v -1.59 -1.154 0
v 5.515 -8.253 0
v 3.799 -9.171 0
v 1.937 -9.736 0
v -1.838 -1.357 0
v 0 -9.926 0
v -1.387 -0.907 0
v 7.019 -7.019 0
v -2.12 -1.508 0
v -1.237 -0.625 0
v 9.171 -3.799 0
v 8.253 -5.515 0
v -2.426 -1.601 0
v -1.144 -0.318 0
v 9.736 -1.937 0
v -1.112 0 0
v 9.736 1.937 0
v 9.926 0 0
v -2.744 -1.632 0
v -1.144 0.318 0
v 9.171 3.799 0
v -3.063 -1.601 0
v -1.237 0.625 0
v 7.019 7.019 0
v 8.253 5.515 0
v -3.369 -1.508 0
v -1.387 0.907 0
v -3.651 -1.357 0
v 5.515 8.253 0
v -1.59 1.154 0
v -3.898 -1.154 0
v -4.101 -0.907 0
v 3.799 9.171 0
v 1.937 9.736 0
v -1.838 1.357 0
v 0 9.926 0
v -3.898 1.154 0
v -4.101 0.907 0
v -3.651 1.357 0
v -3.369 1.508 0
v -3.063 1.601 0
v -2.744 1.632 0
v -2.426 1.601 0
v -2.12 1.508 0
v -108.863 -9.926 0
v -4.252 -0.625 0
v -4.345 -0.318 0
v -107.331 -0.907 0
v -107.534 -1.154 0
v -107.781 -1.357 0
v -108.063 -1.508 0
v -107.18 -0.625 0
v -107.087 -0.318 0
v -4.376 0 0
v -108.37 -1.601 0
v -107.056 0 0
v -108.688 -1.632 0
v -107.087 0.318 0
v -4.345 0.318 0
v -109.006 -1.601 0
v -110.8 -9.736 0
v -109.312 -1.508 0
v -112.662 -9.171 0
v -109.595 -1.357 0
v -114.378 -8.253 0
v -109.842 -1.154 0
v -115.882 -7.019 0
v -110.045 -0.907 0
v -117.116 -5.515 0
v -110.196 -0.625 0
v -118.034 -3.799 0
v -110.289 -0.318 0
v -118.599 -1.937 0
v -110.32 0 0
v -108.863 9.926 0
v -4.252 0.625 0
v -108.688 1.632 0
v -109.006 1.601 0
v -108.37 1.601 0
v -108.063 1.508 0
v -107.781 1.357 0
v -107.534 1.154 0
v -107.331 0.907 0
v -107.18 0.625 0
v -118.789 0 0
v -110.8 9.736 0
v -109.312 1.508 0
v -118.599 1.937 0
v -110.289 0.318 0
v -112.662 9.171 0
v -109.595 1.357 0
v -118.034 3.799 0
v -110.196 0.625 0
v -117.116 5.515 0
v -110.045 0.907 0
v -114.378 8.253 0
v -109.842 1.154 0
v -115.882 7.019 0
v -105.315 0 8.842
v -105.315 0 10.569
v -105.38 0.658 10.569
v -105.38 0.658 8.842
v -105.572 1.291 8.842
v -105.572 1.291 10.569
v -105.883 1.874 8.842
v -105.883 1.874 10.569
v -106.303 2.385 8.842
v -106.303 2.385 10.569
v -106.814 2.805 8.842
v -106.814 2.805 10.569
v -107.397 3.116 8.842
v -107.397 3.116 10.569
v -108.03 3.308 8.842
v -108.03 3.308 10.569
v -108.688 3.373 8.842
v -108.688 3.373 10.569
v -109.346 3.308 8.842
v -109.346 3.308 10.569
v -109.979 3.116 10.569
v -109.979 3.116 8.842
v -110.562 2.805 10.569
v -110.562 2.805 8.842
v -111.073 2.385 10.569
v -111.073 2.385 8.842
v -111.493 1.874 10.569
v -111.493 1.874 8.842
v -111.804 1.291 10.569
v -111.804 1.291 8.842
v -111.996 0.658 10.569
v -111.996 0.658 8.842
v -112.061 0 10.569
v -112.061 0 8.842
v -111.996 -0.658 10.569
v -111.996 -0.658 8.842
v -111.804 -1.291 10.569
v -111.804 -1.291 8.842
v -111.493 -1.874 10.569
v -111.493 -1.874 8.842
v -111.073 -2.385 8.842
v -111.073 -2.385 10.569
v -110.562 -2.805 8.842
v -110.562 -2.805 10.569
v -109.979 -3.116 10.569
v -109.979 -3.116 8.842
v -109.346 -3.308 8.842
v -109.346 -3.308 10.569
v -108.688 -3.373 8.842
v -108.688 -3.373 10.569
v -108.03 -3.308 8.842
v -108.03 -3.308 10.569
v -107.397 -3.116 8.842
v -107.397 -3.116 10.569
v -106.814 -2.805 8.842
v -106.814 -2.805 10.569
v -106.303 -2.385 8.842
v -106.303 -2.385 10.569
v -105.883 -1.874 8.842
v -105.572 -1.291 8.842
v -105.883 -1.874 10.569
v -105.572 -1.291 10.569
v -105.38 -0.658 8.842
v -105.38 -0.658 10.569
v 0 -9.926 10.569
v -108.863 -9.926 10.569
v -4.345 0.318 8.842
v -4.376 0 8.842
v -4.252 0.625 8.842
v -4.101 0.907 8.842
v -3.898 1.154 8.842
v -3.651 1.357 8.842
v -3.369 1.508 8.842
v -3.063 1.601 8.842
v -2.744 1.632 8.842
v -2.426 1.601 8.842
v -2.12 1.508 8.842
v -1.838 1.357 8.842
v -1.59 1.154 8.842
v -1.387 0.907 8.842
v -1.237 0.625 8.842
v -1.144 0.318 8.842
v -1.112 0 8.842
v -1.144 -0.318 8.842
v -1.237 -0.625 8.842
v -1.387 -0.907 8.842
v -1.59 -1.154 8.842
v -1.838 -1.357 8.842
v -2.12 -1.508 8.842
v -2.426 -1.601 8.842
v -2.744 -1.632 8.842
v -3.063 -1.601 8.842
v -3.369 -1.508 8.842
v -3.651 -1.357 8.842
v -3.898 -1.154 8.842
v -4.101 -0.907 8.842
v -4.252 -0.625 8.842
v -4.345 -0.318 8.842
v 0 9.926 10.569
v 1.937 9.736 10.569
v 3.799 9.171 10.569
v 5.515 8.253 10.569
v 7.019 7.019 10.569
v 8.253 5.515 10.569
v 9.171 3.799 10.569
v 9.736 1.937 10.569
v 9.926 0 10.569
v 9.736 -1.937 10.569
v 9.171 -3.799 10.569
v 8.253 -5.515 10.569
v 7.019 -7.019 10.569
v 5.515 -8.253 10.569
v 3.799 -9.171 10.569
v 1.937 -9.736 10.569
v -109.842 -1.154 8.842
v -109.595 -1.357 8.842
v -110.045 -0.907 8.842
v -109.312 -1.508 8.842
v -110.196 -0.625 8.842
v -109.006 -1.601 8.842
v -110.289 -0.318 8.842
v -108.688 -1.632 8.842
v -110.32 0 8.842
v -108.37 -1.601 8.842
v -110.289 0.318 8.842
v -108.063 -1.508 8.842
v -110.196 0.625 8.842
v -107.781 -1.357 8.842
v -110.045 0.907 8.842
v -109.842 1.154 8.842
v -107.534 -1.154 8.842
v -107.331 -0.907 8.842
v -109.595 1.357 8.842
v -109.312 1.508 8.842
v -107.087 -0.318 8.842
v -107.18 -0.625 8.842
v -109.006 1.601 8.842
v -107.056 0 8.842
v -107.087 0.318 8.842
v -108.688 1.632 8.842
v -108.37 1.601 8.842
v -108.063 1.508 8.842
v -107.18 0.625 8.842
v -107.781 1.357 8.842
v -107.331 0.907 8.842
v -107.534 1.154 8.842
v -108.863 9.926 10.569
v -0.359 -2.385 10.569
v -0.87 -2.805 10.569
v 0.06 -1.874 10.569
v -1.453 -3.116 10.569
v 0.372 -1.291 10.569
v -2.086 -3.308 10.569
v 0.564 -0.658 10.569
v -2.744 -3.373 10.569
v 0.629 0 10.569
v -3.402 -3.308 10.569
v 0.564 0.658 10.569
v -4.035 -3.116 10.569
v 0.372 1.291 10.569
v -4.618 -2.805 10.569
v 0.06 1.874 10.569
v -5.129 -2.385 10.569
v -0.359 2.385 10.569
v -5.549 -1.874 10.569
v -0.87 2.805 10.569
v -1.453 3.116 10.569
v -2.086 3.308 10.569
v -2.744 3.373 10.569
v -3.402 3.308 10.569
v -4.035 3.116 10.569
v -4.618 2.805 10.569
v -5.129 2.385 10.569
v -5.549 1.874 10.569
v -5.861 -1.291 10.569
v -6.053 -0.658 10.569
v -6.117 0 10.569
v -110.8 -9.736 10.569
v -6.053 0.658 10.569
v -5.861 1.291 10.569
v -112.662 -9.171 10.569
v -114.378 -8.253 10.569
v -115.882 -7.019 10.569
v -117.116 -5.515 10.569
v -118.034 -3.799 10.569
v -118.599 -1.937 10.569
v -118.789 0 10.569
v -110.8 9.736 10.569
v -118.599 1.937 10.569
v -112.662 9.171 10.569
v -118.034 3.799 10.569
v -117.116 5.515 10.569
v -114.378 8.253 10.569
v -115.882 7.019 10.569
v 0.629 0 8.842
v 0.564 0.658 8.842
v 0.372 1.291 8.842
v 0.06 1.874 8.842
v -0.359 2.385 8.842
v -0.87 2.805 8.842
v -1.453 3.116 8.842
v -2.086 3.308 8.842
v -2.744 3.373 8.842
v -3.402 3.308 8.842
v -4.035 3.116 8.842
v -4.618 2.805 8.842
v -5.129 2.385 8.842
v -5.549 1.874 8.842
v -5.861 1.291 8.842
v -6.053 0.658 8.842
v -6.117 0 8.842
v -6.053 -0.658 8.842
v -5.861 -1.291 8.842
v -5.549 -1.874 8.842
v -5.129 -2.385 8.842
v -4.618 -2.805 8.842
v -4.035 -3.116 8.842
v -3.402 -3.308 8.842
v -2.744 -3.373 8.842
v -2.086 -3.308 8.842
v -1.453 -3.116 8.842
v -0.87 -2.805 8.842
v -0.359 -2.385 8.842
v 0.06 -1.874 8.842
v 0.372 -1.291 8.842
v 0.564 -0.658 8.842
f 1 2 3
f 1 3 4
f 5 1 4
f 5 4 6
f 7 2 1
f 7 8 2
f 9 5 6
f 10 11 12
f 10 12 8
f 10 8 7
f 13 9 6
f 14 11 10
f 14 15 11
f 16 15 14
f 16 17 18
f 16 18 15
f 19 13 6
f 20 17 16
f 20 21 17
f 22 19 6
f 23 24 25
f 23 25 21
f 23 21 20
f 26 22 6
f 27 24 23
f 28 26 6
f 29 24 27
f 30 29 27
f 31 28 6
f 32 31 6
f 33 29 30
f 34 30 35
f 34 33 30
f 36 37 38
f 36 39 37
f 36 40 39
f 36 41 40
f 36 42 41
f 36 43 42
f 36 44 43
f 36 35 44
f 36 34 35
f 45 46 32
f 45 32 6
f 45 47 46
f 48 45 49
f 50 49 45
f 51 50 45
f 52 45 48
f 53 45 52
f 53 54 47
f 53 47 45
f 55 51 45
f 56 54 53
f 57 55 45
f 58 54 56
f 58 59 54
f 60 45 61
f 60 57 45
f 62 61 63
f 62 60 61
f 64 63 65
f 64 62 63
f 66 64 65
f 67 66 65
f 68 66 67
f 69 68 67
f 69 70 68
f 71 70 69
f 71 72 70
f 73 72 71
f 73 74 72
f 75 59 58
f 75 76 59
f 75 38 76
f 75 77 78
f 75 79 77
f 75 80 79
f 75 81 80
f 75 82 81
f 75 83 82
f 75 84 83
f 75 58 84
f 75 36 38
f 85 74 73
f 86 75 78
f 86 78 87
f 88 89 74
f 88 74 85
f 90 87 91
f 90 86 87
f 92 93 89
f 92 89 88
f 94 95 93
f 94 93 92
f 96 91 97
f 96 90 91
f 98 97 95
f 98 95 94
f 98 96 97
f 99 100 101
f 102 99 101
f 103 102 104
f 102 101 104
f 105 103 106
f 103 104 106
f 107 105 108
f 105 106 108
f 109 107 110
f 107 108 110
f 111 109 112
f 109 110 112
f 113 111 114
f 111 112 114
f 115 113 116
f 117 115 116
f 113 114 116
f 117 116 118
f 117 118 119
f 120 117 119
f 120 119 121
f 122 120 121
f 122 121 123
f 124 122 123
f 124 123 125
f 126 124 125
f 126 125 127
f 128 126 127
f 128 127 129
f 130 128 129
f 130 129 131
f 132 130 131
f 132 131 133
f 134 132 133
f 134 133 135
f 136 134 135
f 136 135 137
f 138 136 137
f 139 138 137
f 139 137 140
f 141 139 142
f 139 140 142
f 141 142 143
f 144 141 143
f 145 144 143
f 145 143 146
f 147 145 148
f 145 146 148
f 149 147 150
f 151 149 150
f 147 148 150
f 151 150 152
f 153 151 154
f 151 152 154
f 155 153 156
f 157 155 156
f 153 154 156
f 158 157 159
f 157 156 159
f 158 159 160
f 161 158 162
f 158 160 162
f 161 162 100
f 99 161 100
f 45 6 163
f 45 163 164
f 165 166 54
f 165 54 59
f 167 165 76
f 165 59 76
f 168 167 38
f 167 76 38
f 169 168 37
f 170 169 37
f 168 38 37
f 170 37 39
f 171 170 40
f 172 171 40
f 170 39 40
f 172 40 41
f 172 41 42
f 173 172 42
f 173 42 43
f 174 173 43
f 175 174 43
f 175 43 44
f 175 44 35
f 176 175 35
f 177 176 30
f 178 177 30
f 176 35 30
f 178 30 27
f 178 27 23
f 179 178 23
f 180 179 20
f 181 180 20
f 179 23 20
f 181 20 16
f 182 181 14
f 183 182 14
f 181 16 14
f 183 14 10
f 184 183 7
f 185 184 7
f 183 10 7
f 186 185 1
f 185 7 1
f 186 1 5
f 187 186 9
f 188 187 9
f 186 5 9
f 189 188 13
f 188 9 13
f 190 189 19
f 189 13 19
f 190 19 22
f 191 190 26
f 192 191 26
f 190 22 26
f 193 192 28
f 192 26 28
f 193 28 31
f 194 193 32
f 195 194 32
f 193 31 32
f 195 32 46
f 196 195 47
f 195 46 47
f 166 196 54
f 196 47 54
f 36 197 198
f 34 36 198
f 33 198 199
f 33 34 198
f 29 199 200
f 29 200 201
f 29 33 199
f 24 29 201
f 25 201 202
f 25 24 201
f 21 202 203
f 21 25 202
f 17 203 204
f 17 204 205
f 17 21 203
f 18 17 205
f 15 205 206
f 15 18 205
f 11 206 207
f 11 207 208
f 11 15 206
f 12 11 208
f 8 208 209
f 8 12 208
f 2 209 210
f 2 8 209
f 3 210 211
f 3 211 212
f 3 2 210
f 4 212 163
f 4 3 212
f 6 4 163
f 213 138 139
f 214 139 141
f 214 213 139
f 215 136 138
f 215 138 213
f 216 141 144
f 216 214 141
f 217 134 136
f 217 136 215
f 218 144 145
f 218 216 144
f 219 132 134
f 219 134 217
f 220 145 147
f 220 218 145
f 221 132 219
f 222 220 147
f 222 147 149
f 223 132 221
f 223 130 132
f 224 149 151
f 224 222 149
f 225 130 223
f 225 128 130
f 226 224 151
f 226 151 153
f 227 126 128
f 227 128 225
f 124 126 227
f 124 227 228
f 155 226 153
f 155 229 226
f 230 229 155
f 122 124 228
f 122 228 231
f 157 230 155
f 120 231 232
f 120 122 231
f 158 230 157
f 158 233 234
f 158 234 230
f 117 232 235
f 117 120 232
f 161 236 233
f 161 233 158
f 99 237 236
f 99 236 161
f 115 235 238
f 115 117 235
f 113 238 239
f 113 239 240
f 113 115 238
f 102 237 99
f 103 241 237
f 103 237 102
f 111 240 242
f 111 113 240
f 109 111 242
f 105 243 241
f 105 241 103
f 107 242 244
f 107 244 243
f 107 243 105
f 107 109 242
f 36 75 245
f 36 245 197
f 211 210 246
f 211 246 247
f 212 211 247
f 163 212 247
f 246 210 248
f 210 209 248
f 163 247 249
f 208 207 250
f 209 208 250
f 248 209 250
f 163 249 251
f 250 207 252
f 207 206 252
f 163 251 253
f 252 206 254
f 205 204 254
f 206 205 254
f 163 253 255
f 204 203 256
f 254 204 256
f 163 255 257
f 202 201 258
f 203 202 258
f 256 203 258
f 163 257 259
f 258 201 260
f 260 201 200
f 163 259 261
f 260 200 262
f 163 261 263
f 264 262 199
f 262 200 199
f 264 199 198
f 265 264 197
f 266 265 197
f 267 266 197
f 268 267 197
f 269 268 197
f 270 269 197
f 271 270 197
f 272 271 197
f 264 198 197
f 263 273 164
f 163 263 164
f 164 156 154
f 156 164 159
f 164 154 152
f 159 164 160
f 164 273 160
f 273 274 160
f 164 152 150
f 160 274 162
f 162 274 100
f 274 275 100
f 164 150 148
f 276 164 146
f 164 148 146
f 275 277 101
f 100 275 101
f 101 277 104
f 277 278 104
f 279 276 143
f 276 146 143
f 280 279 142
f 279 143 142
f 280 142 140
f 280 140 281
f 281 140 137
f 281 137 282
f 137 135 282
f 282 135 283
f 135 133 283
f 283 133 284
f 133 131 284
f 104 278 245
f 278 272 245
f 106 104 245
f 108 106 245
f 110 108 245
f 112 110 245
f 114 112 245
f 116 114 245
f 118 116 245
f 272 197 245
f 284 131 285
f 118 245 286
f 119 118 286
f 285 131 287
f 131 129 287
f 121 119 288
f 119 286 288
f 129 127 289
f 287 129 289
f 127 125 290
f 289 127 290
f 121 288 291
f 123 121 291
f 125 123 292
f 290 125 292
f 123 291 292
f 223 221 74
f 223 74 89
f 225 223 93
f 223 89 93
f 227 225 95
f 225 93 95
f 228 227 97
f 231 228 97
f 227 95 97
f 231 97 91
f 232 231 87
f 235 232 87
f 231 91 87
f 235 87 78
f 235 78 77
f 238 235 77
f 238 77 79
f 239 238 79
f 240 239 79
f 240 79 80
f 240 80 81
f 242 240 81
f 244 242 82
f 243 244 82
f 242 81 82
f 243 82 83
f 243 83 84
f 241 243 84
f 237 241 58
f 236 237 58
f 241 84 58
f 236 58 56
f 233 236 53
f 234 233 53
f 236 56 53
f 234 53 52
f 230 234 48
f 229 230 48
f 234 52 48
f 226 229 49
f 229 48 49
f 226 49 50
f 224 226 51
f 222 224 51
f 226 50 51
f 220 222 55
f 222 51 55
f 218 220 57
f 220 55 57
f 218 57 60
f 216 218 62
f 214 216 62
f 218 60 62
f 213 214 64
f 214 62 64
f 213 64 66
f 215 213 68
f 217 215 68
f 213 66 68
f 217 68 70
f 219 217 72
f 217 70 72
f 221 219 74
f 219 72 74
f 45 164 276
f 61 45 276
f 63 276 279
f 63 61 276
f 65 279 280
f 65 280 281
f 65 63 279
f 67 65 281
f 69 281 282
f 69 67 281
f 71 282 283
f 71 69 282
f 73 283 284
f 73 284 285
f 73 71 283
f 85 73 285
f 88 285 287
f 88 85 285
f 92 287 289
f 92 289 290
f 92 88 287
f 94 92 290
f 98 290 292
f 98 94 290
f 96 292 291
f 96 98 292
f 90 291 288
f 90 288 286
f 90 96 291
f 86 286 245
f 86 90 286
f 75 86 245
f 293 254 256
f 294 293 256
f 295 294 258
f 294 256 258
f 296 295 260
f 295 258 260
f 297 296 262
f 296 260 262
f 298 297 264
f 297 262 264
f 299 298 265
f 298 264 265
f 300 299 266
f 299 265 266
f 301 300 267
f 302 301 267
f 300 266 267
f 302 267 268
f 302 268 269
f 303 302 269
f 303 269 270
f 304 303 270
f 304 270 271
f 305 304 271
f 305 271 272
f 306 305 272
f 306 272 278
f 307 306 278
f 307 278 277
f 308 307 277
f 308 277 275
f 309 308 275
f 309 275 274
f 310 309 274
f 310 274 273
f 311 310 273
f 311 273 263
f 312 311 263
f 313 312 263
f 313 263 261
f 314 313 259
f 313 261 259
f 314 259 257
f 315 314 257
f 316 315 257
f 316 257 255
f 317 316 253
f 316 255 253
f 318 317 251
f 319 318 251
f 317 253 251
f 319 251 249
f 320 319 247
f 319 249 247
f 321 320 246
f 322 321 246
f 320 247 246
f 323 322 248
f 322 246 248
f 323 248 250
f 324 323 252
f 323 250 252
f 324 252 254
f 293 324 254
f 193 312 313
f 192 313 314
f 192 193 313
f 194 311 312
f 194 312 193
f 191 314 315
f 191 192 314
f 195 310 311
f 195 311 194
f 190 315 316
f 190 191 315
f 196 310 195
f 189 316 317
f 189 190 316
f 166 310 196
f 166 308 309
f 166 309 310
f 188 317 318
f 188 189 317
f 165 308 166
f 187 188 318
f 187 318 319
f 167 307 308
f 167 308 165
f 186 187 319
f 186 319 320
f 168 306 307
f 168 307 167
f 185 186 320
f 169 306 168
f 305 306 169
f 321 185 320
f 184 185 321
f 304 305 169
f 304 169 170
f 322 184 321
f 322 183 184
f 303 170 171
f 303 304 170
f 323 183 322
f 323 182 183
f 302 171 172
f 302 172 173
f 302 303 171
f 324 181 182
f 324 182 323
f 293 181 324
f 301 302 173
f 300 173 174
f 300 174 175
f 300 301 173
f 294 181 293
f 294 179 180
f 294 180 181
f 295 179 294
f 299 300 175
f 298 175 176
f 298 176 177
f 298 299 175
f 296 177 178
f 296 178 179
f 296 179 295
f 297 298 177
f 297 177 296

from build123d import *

# Parameters (mm, degrees)
BOSS_EXTRUDE1_DEPTH                                 = 10.568712475
CBORE_FOR_4_BINDING_HEAD_MACHINE_SCREW1_D           = 3.2639
CBORE_FOR_4_BINDING_HEAD_MACHINE_SCREW1_CBORE_D     = 6.74624
CBORE_FOR_4_BINDING_HEAD_MACHINE_SCREW1_CBORE_DEPTH = 1.7272
CBORE_FOR_4_BINDING_HEAD_MACHINE_SCREW2_D           = 3.2639
CBORE_FOR_4_BINDING_HEAD_MACHINE_SCREW2_CBORE_D     = 6.74624
CBORE_FOR_4_BINDING_HEAD_MACHINE_SCREW2_CBORE_DEPTH = 1.7272


with BuildPart() as part:
    # Sketch1 → Boss-Extrude1 (new body)
    with BuildSketch(Plane.XY):
        with BuildLine():
            Line((0, -9.926359007), (-108.863033935, -9.926359007))
            ThreePointArc((-108.863033935, -9.926359007), (-118.789392942, 0), (-108.863033935, 9.926359007))
            Line((-108.863033935, 9.926359007), (0, 9.926359007))
            ThreePointArc((0, 9.926359007), (9.926359007, 0), (0, -9.926359007))
        make_face()
    extrude(amount=BOSS_EXTRUDE1_DEPTH)

    # CBORE for #4 Binding Head Machine Screw1 (through all)
    with Locations(Plane.XY.offset(10.568712475)):
        with Locations((-2.744321225, 0)):
            CounterBoreHole(CBORE_FOR_4_BINDING_HEAD_MACHINE_SCREW1_D / 2, CBORE_FOR_4_BINDING_HEAD_MACHINE_SCREW1_CBORE_D / 2, CBORE_FOR_4_BINDING_HEAD_MACHINE_SCREW1_CBORE_DEPTH)

    # CBORE for #4 Binding Head Machine Screw2 (through all)
    with Locations(Plane.XY.offset(10.568712475)):
        with Locations((-108.687959282, 0)):
            CounterBoreHole(CBORE_FOR_4_BINDING_HEAD_MACHINE_SCREW2_D / 2, CBORE_FOR_4_BINDING_HEAD_MACHINE_SCREW2_CBORE_D / 2, CBORE_FOR_4_BINDING_HEAD_MACHINE_SCREW2_CBORE_DEPTH)


solid = part.part
